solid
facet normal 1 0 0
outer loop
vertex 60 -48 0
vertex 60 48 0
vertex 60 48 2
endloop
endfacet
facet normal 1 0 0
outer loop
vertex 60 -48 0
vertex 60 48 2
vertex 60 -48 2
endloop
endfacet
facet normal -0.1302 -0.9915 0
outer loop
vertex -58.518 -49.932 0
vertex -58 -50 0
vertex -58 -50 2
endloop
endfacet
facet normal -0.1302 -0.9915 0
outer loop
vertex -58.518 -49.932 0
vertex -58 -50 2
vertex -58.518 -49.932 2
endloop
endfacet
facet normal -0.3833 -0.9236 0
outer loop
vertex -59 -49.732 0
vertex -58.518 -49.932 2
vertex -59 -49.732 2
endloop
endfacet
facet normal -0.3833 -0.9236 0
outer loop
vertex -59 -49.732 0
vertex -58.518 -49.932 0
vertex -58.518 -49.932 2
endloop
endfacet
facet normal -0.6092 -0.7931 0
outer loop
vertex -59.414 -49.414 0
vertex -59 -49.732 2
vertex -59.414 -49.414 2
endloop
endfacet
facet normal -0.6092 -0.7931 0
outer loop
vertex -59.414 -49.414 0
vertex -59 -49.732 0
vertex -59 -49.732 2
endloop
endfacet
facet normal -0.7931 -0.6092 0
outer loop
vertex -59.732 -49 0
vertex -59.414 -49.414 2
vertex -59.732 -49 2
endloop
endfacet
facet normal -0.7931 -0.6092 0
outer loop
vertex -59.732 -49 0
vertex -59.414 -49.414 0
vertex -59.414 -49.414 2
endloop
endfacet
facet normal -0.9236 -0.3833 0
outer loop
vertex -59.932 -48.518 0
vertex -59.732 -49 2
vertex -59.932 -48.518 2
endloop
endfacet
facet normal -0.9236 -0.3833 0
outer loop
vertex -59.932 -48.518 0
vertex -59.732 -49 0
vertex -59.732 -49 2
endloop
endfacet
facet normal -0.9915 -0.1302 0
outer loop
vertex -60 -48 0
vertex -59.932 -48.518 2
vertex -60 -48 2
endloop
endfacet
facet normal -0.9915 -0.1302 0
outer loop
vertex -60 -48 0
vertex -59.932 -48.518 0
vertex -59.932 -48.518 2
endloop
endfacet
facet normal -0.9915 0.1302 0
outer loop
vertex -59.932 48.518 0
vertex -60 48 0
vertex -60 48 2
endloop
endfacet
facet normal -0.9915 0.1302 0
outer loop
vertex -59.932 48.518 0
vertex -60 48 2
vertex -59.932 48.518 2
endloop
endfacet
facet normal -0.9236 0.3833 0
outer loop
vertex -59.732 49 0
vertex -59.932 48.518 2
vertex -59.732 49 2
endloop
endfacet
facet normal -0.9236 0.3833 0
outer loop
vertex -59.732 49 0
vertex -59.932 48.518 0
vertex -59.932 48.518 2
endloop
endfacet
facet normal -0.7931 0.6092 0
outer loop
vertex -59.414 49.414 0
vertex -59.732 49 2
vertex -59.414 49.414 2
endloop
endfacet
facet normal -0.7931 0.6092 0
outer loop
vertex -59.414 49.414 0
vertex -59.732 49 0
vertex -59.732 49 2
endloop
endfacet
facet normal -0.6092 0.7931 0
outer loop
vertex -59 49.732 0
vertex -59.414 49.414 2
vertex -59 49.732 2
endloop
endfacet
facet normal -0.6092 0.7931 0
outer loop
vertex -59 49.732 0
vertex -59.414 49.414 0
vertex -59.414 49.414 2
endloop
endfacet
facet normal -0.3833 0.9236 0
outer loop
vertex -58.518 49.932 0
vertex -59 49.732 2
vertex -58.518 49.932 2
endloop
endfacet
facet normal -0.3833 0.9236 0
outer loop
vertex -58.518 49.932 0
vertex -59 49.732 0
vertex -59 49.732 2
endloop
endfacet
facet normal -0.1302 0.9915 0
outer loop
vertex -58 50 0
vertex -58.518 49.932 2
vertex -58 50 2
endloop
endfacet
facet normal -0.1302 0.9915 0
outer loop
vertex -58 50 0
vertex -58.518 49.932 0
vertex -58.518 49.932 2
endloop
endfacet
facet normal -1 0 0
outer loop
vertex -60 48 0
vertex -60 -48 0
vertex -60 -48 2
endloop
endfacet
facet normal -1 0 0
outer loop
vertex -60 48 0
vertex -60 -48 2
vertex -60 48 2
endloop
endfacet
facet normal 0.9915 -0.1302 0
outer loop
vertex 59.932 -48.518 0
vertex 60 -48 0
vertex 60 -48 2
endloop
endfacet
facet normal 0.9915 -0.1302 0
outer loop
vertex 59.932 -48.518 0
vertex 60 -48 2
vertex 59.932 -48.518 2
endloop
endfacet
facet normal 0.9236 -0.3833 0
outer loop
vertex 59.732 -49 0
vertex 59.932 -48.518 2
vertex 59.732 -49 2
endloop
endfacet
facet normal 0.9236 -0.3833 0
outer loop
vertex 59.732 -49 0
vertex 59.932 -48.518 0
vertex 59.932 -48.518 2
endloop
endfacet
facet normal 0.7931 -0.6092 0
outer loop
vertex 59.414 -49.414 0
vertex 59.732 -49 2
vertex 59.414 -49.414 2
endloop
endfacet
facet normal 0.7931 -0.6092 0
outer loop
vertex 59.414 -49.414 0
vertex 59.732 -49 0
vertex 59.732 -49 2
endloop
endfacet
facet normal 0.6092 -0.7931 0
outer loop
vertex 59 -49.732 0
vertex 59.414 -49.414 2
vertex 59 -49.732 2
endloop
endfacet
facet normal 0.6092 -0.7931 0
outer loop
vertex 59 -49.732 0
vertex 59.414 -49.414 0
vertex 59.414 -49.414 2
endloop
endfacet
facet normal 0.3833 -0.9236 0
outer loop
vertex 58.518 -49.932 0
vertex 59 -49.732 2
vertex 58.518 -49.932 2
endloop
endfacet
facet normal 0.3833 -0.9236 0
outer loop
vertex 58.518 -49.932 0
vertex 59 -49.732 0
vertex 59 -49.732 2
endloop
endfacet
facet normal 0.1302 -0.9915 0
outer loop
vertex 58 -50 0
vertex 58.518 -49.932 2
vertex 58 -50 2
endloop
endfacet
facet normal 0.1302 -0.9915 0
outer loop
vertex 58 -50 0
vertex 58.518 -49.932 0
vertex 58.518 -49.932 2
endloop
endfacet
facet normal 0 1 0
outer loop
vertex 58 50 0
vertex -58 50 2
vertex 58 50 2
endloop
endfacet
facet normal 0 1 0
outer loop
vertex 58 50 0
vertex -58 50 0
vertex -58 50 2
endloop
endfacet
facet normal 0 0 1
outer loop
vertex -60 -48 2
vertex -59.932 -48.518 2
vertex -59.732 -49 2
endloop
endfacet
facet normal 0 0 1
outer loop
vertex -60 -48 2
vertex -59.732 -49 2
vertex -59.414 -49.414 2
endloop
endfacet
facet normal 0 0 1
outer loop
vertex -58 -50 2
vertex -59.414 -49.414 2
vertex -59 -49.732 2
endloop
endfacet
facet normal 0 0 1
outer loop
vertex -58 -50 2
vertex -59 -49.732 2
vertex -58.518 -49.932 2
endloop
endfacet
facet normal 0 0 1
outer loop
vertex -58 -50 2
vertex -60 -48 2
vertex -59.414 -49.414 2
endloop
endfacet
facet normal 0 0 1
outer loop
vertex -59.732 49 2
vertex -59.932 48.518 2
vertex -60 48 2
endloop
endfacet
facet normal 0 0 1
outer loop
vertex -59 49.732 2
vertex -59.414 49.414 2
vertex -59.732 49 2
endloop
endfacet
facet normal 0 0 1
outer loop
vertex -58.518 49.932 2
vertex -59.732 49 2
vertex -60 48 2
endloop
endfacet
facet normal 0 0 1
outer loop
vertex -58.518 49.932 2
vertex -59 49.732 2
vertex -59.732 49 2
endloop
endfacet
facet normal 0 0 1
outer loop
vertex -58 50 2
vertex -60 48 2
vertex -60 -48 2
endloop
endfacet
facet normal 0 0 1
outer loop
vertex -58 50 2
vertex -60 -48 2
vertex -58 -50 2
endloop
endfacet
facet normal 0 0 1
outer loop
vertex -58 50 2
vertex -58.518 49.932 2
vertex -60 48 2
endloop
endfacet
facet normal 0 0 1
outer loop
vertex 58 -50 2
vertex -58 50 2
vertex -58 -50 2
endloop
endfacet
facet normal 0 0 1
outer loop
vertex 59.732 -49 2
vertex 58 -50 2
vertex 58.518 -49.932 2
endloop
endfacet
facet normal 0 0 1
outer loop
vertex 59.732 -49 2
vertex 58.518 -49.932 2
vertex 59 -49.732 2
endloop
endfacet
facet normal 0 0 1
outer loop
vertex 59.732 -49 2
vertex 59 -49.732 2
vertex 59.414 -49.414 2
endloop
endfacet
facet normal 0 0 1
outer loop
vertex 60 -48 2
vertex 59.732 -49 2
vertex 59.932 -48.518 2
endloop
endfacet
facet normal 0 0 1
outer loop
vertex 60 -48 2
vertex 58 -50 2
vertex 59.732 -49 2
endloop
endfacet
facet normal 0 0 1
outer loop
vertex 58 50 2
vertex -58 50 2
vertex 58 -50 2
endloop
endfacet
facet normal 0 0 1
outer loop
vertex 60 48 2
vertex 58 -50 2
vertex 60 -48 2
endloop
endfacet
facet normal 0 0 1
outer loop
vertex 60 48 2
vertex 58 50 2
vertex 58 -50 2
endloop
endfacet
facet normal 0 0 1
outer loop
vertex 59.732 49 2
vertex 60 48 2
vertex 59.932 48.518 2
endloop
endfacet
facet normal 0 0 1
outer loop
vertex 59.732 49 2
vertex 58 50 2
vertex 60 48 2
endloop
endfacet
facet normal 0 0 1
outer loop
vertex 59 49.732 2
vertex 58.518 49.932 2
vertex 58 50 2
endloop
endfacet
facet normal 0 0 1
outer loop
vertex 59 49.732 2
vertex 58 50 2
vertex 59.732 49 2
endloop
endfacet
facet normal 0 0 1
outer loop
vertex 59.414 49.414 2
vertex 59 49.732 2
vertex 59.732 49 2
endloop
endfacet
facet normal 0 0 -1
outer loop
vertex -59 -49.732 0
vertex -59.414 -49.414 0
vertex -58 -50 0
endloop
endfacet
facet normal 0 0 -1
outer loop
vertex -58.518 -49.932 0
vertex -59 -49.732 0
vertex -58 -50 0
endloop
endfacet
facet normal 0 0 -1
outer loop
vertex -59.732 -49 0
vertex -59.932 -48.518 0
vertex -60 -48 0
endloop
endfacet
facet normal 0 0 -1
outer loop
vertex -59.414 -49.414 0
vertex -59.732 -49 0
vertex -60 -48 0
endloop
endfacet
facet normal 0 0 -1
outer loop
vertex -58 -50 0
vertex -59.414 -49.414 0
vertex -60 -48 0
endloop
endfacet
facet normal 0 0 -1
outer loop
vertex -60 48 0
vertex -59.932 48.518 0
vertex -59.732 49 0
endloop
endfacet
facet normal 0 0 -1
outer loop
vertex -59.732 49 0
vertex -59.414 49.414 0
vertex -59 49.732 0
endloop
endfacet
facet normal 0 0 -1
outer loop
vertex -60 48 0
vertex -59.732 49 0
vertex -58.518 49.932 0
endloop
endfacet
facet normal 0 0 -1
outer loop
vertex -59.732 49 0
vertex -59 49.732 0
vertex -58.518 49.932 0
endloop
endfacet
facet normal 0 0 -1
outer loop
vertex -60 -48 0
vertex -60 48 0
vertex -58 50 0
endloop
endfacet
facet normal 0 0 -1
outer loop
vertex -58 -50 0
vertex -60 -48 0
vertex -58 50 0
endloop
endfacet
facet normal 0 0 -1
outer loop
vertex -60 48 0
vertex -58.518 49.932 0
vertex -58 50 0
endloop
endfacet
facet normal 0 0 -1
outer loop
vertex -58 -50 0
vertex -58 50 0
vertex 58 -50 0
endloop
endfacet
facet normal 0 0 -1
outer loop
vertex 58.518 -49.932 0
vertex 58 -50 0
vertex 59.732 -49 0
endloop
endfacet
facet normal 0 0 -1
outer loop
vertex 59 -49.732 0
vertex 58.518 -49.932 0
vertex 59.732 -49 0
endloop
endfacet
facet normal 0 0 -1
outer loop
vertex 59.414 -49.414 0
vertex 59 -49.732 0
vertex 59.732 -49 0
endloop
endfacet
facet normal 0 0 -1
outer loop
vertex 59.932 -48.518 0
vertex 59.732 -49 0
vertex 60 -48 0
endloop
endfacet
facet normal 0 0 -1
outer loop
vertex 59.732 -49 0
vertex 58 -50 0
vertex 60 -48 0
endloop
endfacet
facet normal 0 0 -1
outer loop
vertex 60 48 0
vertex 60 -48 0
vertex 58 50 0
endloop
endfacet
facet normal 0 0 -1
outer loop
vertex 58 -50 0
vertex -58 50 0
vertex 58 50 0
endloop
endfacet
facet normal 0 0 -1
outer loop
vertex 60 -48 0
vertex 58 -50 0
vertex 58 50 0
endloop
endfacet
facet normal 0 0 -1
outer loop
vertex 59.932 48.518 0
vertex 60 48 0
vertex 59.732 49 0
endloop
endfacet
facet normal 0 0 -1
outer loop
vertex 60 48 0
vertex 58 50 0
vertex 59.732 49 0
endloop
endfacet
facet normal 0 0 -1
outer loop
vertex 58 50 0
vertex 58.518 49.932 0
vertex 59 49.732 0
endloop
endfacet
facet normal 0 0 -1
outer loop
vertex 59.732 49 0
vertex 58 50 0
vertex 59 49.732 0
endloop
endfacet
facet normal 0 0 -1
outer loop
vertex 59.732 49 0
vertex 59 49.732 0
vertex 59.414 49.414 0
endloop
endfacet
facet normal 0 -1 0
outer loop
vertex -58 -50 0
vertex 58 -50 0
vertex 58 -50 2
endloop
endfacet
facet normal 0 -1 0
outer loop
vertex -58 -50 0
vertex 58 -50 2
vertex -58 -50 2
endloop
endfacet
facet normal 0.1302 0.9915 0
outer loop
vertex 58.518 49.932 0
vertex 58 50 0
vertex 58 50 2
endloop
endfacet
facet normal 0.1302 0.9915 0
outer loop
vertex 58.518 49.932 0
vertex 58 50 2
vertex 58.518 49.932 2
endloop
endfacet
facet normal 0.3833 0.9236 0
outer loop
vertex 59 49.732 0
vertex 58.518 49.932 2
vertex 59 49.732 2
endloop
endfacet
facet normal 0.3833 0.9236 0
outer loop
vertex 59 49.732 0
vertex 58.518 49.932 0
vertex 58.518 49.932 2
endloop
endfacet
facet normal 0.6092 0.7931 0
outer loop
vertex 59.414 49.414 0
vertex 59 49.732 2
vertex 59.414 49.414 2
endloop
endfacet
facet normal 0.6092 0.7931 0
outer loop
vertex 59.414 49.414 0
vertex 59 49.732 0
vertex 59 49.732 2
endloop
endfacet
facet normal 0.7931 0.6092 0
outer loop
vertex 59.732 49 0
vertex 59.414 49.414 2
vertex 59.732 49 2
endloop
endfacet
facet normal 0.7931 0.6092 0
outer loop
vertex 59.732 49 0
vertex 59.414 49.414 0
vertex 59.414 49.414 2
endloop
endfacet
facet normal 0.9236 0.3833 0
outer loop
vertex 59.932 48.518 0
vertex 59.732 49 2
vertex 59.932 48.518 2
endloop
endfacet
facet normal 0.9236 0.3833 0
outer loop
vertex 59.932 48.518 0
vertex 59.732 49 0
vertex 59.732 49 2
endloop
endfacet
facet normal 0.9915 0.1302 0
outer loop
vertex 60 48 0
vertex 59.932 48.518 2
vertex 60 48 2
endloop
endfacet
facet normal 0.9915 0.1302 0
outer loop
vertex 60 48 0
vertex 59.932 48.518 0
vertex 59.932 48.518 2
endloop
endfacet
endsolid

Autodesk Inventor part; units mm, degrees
ref_plane "YZ Plane" through (0, 0, 0) normal (1, 0, 0) x (0, 1, 0)
ref_plane "XZ Plane" through (0, 0, 0) normal (0, 1, 0) x (-1, 0, 0)
ref_plane "XY Plane" through (0, 0, 0) normal (0, 0, 1) x (1, 0, 0)
sketch "Skizze1" plane through (0, 0, 0) normal (0, 0, 1) x (1, 0, 0)
  line L0 (0, -70.5799) -> (0, 70.5799) construction
  line L1 (-84.5799, 0) -> (84.5799, 0) construction
  line L2 (-58, 50) -> (58, 50)
  line L3 (60, 48) -> (60, -48)
  line L4 (58, -50) -> (-58, -50)
  line L5 (-60, -48) -> (-60, 48)
  arc A0 (-60, -48) -> (-58, -50) centre (-58, -48) ccw
  arc A1 (58, -50) -> (60, -48) centre (58, -48) ccw
  arc A2 (60, 48) -> (58, 50) centre (58, 48) ccw
  arc A3 (-58, 50) -> (-60, 48) centre (-58, 48) ccw
  point P0 (0, 0)
  point P1 (-60, 50)
  point P2 (60, -50)
  point P3 (60, 50)
  point P4 (-60, -50)
  dimension "d14" = 120
  dimension "d15" = 100
  dimension "d16" = 2
extrude "Extrusion1" add sketch "Skizze1" along normal blind 2
properties part number "ControllerPCB"
